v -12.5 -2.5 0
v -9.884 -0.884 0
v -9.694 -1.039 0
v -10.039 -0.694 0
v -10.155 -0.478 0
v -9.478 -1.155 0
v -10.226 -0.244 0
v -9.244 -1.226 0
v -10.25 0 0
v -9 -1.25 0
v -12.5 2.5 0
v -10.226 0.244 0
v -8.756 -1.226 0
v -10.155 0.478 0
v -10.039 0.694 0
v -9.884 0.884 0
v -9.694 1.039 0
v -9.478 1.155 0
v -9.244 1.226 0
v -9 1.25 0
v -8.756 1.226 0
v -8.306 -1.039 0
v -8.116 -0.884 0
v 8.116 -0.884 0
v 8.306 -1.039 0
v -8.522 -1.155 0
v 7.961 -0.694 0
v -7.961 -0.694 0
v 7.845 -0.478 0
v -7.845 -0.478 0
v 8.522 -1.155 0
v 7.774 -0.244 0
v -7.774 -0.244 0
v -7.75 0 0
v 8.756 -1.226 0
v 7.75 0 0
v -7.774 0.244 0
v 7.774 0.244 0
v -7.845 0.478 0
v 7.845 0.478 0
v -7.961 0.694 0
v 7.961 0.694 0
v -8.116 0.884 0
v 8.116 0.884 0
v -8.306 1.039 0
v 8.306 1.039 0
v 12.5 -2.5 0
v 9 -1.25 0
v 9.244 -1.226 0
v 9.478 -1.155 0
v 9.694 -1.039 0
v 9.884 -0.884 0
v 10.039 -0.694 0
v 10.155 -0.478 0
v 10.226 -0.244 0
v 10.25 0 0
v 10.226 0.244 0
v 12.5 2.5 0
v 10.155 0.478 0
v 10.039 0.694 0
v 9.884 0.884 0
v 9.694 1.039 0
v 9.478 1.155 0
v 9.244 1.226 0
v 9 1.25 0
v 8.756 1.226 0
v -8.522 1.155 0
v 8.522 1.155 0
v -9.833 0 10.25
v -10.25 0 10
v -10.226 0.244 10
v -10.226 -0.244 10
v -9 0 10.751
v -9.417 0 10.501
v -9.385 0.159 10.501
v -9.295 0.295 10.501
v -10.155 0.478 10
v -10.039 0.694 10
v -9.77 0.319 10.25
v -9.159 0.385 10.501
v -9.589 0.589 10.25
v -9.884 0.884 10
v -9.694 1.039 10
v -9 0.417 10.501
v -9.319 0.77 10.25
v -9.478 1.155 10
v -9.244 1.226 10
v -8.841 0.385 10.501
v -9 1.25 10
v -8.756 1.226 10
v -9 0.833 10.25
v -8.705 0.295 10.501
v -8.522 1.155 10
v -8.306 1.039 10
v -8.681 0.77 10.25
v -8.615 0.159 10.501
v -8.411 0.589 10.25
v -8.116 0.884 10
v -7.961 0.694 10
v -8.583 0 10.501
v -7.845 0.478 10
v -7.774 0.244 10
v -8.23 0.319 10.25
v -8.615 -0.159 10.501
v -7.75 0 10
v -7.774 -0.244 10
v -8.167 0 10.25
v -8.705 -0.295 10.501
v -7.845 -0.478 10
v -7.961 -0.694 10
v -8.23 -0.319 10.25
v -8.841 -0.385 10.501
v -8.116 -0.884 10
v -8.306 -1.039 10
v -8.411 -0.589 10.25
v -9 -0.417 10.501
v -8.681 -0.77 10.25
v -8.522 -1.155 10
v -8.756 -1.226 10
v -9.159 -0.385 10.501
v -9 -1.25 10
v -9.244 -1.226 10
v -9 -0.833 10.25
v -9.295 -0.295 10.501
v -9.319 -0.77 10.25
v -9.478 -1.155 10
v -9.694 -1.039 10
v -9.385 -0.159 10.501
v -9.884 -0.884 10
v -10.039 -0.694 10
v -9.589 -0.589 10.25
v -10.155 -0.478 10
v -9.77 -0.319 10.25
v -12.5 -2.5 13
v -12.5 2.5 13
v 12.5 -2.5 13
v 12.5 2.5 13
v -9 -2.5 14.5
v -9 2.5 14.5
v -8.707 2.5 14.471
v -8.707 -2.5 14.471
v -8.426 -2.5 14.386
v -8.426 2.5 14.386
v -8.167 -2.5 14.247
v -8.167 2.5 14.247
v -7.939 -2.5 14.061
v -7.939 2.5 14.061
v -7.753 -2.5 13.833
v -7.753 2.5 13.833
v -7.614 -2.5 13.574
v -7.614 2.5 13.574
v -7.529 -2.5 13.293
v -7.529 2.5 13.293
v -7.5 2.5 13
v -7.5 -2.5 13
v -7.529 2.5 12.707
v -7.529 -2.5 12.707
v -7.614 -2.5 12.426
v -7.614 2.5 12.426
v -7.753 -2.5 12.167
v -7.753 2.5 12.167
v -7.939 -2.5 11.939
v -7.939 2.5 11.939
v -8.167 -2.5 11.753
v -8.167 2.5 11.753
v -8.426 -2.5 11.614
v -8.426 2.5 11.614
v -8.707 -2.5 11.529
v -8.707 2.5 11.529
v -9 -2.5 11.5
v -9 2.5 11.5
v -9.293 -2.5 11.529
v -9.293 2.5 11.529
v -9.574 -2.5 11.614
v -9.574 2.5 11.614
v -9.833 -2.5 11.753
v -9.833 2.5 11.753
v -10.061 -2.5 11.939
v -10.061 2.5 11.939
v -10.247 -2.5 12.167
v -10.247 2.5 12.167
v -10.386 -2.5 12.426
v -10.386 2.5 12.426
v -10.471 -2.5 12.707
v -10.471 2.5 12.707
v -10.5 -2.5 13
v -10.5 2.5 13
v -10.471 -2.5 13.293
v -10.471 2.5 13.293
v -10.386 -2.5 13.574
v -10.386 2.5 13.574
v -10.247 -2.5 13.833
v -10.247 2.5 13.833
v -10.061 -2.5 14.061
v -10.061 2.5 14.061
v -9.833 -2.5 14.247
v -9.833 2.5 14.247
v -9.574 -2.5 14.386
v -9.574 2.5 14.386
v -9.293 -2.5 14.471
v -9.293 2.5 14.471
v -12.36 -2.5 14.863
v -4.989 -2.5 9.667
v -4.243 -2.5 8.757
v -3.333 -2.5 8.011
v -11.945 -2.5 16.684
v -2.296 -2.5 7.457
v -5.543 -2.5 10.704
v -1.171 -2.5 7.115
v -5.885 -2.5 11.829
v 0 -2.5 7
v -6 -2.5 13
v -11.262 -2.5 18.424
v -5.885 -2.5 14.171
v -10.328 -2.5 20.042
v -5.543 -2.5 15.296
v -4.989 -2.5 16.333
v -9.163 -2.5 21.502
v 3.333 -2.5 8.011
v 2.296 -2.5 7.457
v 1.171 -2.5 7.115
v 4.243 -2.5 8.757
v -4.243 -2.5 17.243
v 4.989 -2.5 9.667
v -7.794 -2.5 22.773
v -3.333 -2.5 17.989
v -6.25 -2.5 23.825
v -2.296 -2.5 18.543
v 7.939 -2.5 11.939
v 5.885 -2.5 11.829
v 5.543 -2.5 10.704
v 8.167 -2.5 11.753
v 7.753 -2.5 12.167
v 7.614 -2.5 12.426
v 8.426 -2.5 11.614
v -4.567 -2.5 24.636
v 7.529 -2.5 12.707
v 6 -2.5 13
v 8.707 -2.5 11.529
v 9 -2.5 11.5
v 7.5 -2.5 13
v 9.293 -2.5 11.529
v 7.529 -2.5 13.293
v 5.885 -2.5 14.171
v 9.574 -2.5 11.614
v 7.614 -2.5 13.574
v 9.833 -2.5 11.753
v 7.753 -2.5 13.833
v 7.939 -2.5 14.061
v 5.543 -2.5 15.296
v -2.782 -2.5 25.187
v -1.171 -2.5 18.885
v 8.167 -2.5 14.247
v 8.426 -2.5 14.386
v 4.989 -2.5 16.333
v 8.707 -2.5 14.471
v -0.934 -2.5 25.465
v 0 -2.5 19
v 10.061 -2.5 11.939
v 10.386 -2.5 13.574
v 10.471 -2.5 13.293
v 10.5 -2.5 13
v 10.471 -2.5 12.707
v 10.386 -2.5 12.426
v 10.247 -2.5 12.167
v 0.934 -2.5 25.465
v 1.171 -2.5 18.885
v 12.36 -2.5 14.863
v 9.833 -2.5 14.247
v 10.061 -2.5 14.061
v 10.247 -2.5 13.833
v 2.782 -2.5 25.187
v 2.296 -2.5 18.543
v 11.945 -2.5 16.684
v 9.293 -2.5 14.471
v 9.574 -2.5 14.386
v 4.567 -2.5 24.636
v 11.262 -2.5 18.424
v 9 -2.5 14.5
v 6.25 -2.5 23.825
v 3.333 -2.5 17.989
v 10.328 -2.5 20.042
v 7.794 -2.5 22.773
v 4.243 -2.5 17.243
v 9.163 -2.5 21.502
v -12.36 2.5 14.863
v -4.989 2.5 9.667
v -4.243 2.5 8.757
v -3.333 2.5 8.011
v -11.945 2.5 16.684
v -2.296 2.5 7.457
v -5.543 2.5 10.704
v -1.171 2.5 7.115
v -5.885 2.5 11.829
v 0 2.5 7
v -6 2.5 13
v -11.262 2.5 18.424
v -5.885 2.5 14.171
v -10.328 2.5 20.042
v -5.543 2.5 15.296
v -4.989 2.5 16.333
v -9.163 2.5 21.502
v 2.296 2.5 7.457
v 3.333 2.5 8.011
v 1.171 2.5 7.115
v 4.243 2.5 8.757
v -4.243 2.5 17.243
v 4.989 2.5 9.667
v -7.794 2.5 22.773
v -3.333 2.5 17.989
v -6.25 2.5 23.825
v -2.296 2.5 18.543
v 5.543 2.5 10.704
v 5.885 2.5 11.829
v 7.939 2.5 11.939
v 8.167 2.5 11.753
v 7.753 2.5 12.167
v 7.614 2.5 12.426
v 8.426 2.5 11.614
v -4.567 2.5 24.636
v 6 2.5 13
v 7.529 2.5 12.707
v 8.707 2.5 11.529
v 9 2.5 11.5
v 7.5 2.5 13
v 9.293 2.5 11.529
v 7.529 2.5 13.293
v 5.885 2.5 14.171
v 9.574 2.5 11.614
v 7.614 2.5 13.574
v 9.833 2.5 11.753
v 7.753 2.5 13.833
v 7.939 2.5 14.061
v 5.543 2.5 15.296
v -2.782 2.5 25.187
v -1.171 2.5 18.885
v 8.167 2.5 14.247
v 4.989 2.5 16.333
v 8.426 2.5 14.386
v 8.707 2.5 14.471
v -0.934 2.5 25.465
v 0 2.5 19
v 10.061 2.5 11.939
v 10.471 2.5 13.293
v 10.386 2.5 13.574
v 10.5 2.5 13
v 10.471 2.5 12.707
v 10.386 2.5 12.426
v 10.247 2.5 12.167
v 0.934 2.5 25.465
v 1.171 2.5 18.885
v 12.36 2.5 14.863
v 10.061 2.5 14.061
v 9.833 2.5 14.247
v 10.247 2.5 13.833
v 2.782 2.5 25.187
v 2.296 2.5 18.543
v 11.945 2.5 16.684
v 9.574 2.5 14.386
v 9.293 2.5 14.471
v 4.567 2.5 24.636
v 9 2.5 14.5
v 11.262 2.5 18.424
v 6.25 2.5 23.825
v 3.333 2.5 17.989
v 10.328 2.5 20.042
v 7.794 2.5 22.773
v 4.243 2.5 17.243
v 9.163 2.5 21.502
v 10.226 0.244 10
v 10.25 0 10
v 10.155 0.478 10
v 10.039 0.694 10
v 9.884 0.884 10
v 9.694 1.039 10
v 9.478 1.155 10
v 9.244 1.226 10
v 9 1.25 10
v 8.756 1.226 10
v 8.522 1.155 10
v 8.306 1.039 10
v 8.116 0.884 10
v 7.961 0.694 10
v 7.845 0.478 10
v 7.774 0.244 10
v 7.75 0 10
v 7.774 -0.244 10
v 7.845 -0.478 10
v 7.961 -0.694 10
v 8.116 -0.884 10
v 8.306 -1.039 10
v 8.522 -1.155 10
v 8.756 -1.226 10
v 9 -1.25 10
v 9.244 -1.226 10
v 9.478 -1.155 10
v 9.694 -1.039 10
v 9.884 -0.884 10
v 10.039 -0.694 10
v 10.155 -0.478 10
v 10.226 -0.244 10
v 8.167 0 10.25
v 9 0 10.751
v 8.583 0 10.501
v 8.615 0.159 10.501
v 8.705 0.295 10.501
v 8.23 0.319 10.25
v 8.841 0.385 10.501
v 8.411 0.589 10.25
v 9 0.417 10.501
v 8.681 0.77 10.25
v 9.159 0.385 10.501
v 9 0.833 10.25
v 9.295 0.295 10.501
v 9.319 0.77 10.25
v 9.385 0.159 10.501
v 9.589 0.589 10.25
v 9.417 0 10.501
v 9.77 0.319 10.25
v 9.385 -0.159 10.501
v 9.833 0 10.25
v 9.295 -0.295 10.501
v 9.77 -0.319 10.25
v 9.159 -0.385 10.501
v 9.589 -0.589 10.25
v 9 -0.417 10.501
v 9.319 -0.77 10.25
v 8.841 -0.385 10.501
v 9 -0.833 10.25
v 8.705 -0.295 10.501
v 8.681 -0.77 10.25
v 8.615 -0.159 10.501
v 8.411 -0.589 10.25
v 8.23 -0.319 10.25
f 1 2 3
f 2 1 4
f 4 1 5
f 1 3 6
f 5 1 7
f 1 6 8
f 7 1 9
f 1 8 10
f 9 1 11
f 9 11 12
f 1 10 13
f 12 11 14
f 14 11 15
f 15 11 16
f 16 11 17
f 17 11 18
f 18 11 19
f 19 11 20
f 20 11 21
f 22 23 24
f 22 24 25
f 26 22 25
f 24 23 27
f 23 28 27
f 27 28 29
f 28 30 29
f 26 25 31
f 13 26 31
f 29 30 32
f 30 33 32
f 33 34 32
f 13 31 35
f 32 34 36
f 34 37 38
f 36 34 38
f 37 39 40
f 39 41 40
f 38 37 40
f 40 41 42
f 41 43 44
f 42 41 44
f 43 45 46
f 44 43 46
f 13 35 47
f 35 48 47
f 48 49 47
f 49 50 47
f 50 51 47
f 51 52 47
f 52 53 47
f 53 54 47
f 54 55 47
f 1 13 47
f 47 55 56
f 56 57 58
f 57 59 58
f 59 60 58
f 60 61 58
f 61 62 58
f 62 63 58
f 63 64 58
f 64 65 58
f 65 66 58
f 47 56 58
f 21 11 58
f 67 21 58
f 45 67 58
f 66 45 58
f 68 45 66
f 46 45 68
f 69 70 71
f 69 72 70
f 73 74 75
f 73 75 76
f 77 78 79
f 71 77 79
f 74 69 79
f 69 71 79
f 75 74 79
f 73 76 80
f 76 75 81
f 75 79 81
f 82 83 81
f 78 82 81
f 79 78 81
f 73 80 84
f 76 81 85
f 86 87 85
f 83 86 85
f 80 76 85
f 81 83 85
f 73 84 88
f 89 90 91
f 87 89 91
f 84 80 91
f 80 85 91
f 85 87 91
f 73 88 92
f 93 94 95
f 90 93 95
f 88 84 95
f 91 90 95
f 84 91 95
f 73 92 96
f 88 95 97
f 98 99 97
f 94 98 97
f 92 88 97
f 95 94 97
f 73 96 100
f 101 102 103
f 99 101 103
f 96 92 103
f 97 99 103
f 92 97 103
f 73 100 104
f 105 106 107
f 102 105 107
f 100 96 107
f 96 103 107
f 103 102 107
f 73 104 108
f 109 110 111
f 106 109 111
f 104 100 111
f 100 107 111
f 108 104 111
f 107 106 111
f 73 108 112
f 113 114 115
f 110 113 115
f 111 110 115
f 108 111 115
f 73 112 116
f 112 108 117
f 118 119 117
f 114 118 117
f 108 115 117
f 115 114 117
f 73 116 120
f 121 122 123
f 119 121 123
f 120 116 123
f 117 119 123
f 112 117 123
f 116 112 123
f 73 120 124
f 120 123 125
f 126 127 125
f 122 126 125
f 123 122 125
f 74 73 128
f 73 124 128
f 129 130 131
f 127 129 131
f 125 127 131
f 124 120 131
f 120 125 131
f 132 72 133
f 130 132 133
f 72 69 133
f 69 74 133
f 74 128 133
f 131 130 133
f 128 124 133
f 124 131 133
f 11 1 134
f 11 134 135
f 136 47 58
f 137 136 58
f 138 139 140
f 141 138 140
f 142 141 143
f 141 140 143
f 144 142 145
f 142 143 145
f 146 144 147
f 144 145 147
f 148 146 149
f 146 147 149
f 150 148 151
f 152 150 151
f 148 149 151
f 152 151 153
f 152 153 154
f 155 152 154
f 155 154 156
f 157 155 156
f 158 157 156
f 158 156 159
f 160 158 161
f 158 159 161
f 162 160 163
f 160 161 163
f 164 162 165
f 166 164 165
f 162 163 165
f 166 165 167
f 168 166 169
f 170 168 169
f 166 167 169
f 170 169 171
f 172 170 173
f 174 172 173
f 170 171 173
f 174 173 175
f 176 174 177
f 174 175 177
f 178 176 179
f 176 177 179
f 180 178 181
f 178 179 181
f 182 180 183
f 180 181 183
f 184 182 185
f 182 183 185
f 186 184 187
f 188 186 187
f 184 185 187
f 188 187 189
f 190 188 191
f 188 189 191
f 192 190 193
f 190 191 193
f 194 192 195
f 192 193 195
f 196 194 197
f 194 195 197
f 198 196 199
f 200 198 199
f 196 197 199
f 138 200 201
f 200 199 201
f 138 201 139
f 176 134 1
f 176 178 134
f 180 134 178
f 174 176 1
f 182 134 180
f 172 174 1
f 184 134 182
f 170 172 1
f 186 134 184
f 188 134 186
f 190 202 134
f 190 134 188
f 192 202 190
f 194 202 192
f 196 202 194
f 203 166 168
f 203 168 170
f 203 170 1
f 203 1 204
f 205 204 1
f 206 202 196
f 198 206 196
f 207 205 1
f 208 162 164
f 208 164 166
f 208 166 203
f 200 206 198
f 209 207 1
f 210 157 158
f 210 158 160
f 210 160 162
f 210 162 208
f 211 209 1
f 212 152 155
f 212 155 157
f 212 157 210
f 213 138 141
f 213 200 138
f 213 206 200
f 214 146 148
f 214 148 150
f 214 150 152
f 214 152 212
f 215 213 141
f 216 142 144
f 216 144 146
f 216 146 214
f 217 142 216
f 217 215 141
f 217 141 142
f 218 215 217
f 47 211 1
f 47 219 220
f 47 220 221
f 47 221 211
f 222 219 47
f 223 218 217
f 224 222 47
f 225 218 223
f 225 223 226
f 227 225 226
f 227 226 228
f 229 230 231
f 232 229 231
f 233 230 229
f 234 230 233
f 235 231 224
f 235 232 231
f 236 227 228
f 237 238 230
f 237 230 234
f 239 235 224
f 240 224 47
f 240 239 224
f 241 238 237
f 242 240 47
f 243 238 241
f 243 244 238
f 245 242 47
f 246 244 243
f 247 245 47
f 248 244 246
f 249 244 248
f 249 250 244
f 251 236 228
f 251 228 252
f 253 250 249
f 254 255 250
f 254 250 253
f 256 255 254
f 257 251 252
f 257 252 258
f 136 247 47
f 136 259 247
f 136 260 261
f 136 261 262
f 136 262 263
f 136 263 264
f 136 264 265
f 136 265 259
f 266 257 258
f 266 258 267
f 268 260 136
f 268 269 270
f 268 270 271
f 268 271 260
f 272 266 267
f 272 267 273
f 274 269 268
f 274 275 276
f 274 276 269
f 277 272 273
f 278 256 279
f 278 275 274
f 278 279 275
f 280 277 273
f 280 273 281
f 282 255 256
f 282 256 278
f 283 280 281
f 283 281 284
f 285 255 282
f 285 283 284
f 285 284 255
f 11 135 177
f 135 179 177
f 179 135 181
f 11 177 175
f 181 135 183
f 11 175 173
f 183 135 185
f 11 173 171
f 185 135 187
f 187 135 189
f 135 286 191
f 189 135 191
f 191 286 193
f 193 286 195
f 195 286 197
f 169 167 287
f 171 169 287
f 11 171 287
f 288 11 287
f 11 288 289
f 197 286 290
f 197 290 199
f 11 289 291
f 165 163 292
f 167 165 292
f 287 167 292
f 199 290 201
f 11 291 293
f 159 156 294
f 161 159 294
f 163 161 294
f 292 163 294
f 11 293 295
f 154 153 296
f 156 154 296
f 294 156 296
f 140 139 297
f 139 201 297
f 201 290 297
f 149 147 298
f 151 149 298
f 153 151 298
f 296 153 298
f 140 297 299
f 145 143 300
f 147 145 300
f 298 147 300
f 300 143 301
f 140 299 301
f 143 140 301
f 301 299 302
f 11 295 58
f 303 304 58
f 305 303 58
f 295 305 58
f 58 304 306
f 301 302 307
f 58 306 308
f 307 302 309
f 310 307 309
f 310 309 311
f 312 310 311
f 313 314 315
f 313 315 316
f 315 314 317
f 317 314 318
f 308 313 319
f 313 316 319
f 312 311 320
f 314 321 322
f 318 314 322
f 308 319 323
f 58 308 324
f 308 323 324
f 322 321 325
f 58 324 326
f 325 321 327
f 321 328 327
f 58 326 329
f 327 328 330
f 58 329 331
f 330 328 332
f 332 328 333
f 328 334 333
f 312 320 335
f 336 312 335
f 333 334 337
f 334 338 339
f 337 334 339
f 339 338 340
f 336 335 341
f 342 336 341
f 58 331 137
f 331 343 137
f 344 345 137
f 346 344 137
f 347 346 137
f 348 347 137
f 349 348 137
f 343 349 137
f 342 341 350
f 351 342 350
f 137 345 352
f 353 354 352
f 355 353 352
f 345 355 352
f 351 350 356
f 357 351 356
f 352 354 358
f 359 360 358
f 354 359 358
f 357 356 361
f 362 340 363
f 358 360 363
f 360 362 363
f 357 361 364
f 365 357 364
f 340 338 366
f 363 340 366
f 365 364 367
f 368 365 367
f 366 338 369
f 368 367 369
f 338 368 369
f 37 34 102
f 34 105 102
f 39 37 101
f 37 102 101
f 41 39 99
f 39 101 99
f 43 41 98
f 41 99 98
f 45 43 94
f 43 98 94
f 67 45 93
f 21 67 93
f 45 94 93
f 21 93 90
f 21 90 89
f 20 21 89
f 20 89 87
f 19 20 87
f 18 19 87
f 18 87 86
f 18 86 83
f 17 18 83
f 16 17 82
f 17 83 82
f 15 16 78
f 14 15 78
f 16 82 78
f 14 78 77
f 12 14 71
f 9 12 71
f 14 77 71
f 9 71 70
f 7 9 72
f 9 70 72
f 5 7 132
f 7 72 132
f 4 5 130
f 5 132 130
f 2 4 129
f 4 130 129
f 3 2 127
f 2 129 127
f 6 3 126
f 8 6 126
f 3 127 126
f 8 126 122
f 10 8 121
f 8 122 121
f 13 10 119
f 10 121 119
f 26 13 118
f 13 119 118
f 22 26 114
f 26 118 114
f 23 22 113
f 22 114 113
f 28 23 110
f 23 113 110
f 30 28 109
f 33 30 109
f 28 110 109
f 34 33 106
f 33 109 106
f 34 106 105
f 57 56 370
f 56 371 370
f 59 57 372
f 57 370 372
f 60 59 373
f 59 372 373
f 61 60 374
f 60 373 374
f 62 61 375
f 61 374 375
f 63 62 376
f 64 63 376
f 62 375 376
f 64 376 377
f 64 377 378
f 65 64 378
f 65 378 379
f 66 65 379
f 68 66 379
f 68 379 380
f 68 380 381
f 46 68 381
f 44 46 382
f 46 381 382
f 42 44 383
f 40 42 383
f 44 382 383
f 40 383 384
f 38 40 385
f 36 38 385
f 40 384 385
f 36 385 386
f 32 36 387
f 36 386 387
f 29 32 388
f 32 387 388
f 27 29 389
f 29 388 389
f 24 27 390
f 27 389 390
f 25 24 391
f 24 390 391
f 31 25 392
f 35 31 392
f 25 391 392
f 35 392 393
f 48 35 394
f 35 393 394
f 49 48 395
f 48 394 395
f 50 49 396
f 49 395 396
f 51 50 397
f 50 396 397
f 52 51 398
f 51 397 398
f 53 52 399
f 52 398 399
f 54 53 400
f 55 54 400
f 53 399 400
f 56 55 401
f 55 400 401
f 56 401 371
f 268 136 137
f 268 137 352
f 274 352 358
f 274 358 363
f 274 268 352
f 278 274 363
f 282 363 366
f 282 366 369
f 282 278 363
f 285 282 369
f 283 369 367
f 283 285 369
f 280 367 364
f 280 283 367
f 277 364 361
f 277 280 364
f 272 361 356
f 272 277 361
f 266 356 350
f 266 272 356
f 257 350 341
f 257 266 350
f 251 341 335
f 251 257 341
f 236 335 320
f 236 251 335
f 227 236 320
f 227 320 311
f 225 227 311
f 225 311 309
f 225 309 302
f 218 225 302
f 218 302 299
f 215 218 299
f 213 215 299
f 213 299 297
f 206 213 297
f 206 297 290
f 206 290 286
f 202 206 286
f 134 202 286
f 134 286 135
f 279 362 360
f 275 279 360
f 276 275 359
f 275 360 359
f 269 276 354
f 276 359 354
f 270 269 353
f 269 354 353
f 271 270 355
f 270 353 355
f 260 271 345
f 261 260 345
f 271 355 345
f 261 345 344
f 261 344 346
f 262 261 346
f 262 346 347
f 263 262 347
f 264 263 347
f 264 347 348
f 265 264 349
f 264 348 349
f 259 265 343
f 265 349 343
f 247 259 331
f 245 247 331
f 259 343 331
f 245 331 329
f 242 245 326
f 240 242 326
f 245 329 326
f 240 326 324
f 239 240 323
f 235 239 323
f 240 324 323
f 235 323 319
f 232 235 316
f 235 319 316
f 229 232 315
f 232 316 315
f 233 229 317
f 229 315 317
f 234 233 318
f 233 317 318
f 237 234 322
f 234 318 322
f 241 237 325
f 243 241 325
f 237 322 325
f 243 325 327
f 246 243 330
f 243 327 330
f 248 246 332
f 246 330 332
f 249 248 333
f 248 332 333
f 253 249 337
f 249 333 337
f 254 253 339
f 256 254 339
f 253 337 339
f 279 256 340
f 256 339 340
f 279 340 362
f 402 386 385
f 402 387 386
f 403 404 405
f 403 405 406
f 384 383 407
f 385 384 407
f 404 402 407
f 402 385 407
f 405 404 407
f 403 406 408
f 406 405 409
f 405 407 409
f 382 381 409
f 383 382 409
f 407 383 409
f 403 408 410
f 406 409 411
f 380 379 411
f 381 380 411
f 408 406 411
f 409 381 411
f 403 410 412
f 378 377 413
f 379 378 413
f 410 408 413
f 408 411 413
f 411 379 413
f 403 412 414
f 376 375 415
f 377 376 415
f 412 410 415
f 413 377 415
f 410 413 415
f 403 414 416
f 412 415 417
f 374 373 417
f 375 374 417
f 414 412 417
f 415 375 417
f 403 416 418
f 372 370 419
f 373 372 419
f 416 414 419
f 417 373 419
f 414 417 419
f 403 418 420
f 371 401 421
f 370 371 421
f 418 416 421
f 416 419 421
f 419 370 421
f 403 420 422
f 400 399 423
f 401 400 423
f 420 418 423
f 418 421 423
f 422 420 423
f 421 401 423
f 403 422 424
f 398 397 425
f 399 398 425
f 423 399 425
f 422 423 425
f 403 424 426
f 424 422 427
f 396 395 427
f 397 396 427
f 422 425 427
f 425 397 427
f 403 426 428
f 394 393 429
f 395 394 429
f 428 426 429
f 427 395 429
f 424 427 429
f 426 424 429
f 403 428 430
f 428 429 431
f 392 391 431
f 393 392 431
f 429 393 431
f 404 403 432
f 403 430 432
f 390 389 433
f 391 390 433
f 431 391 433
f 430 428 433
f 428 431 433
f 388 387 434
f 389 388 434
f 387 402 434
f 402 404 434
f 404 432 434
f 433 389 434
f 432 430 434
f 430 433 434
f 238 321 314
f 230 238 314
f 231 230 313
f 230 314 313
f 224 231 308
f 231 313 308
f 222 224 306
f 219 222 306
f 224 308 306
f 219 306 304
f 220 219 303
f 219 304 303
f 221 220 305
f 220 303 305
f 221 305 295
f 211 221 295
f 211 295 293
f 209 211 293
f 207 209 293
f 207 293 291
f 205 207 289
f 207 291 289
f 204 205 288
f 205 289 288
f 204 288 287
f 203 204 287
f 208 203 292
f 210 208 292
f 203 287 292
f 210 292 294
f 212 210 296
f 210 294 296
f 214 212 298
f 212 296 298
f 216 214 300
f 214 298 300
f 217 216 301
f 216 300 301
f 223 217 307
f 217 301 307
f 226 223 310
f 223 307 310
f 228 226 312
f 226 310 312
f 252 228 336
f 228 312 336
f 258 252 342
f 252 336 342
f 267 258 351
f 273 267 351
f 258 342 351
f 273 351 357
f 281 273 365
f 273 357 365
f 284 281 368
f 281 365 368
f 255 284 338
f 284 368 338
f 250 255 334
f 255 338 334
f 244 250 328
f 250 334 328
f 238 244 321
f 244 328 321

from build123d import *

# Parameters (mm, degrees)
SKETCH_1_W          = 25
SKETCH_1_H          = 5
EXTRUDE_1_DEPTH     = 13
SKETCH_2_R          = 12.5
EXTRUDE_2_DEPTH     = 5
CUT_EXTRUDE_1_DEPTH = 5
SKETCH_4_R          = 1.5
CUT_EXTRUDE_2_DEPTH = 5
M3X0_5_1_D          = 2.5
M3X0_5_1_DEPTH      = 10
M3X0_5_1_TIP        = 0.751075774


with BuildPart() as part:
    # ｽｹｯﾁ1 → ﾎﾞｽ - 押し出し1 (new body)
    with BuildSketch(Plane.XY):
        Rectangle(SKETCH_1_W, SKETCH_1_H)
    extrude(amount=EXTRUDE_1_DEPTH)

    # ｽｹｯﾁ2 → ﾎﾞｽ - 押し出し2 (add)
    with BuildSketch(Plane.XZ.offset(2.5)):
        with Locations((0, 13)):
            Circle(SKETCH_2_R)
    extrude(amount=-EXTRUDE_2_DEPTH)

    # ｽｹｯﾁ3 → ｶｯﾄ - 押し出し1 (cut)
    with BuildSketch(Plane(origin=(0, 2.5, 0), x_dir=(1, 0, 0), z_dir=(0, 1, 0))):
        with BuildLine():
            ThreePointArc((-6, -13), (0, -19), (6, -13))
            Line((6, -13), (-6, -13))
        make_face()
        with BuildLine():
            Line((-6, -13), (6, -13))
            ThreePointArc((6, -13), (0, -7), (-6, -13))
        make_face()
    extrude(amount=-CUT_EXTRUDE_1_DEPTH, mode=Mode.SUBTRACT)

    # ｽｹｯﾁ4 → ｶｯﾄ - 押し出し2 (cut)
    with BuildSketch(Plane(origin=(0, 2.5, 0), x_dir=(1, 0, 0), z_dir=(0, 1, 0))):
        with Locations(Location((9, -13, 0), (0, 0, 270))):  # turned: the seam where the file's is
            Circle(SKETCH_4_R)
        with Locations(Location((-9, -13, 0), (0, 0, 270))):  # turned: the seam where the file's is
            Circle(SKETCH_4_R)
    extrude(amount=-CUT_EXTRUDE_2_DEPTH, mode=Mode.SUBTRACT)

    # M3x0.5 ねじ穴1
    with Locations(Plane(origin=(0, 0, 0), x_dir=(-1, 0, 0), z_dir=(0, 0, -1))):
        with Locations((-9, 0), (9, 0)):
            Hole(M3X0_5_1_D / 2, depth=M3X0_5_1_DEPTH)
            with Locations((0, 0, -(M3X0_5_1_DEPTH + M3X0_5_1_TIP / 2))):  # 118° drill point
                Cone(0, M3X0_5_1_D / 2, M3X0_5_1_TIP, mode=Mode.SUBTRACT)


solid = part.part
